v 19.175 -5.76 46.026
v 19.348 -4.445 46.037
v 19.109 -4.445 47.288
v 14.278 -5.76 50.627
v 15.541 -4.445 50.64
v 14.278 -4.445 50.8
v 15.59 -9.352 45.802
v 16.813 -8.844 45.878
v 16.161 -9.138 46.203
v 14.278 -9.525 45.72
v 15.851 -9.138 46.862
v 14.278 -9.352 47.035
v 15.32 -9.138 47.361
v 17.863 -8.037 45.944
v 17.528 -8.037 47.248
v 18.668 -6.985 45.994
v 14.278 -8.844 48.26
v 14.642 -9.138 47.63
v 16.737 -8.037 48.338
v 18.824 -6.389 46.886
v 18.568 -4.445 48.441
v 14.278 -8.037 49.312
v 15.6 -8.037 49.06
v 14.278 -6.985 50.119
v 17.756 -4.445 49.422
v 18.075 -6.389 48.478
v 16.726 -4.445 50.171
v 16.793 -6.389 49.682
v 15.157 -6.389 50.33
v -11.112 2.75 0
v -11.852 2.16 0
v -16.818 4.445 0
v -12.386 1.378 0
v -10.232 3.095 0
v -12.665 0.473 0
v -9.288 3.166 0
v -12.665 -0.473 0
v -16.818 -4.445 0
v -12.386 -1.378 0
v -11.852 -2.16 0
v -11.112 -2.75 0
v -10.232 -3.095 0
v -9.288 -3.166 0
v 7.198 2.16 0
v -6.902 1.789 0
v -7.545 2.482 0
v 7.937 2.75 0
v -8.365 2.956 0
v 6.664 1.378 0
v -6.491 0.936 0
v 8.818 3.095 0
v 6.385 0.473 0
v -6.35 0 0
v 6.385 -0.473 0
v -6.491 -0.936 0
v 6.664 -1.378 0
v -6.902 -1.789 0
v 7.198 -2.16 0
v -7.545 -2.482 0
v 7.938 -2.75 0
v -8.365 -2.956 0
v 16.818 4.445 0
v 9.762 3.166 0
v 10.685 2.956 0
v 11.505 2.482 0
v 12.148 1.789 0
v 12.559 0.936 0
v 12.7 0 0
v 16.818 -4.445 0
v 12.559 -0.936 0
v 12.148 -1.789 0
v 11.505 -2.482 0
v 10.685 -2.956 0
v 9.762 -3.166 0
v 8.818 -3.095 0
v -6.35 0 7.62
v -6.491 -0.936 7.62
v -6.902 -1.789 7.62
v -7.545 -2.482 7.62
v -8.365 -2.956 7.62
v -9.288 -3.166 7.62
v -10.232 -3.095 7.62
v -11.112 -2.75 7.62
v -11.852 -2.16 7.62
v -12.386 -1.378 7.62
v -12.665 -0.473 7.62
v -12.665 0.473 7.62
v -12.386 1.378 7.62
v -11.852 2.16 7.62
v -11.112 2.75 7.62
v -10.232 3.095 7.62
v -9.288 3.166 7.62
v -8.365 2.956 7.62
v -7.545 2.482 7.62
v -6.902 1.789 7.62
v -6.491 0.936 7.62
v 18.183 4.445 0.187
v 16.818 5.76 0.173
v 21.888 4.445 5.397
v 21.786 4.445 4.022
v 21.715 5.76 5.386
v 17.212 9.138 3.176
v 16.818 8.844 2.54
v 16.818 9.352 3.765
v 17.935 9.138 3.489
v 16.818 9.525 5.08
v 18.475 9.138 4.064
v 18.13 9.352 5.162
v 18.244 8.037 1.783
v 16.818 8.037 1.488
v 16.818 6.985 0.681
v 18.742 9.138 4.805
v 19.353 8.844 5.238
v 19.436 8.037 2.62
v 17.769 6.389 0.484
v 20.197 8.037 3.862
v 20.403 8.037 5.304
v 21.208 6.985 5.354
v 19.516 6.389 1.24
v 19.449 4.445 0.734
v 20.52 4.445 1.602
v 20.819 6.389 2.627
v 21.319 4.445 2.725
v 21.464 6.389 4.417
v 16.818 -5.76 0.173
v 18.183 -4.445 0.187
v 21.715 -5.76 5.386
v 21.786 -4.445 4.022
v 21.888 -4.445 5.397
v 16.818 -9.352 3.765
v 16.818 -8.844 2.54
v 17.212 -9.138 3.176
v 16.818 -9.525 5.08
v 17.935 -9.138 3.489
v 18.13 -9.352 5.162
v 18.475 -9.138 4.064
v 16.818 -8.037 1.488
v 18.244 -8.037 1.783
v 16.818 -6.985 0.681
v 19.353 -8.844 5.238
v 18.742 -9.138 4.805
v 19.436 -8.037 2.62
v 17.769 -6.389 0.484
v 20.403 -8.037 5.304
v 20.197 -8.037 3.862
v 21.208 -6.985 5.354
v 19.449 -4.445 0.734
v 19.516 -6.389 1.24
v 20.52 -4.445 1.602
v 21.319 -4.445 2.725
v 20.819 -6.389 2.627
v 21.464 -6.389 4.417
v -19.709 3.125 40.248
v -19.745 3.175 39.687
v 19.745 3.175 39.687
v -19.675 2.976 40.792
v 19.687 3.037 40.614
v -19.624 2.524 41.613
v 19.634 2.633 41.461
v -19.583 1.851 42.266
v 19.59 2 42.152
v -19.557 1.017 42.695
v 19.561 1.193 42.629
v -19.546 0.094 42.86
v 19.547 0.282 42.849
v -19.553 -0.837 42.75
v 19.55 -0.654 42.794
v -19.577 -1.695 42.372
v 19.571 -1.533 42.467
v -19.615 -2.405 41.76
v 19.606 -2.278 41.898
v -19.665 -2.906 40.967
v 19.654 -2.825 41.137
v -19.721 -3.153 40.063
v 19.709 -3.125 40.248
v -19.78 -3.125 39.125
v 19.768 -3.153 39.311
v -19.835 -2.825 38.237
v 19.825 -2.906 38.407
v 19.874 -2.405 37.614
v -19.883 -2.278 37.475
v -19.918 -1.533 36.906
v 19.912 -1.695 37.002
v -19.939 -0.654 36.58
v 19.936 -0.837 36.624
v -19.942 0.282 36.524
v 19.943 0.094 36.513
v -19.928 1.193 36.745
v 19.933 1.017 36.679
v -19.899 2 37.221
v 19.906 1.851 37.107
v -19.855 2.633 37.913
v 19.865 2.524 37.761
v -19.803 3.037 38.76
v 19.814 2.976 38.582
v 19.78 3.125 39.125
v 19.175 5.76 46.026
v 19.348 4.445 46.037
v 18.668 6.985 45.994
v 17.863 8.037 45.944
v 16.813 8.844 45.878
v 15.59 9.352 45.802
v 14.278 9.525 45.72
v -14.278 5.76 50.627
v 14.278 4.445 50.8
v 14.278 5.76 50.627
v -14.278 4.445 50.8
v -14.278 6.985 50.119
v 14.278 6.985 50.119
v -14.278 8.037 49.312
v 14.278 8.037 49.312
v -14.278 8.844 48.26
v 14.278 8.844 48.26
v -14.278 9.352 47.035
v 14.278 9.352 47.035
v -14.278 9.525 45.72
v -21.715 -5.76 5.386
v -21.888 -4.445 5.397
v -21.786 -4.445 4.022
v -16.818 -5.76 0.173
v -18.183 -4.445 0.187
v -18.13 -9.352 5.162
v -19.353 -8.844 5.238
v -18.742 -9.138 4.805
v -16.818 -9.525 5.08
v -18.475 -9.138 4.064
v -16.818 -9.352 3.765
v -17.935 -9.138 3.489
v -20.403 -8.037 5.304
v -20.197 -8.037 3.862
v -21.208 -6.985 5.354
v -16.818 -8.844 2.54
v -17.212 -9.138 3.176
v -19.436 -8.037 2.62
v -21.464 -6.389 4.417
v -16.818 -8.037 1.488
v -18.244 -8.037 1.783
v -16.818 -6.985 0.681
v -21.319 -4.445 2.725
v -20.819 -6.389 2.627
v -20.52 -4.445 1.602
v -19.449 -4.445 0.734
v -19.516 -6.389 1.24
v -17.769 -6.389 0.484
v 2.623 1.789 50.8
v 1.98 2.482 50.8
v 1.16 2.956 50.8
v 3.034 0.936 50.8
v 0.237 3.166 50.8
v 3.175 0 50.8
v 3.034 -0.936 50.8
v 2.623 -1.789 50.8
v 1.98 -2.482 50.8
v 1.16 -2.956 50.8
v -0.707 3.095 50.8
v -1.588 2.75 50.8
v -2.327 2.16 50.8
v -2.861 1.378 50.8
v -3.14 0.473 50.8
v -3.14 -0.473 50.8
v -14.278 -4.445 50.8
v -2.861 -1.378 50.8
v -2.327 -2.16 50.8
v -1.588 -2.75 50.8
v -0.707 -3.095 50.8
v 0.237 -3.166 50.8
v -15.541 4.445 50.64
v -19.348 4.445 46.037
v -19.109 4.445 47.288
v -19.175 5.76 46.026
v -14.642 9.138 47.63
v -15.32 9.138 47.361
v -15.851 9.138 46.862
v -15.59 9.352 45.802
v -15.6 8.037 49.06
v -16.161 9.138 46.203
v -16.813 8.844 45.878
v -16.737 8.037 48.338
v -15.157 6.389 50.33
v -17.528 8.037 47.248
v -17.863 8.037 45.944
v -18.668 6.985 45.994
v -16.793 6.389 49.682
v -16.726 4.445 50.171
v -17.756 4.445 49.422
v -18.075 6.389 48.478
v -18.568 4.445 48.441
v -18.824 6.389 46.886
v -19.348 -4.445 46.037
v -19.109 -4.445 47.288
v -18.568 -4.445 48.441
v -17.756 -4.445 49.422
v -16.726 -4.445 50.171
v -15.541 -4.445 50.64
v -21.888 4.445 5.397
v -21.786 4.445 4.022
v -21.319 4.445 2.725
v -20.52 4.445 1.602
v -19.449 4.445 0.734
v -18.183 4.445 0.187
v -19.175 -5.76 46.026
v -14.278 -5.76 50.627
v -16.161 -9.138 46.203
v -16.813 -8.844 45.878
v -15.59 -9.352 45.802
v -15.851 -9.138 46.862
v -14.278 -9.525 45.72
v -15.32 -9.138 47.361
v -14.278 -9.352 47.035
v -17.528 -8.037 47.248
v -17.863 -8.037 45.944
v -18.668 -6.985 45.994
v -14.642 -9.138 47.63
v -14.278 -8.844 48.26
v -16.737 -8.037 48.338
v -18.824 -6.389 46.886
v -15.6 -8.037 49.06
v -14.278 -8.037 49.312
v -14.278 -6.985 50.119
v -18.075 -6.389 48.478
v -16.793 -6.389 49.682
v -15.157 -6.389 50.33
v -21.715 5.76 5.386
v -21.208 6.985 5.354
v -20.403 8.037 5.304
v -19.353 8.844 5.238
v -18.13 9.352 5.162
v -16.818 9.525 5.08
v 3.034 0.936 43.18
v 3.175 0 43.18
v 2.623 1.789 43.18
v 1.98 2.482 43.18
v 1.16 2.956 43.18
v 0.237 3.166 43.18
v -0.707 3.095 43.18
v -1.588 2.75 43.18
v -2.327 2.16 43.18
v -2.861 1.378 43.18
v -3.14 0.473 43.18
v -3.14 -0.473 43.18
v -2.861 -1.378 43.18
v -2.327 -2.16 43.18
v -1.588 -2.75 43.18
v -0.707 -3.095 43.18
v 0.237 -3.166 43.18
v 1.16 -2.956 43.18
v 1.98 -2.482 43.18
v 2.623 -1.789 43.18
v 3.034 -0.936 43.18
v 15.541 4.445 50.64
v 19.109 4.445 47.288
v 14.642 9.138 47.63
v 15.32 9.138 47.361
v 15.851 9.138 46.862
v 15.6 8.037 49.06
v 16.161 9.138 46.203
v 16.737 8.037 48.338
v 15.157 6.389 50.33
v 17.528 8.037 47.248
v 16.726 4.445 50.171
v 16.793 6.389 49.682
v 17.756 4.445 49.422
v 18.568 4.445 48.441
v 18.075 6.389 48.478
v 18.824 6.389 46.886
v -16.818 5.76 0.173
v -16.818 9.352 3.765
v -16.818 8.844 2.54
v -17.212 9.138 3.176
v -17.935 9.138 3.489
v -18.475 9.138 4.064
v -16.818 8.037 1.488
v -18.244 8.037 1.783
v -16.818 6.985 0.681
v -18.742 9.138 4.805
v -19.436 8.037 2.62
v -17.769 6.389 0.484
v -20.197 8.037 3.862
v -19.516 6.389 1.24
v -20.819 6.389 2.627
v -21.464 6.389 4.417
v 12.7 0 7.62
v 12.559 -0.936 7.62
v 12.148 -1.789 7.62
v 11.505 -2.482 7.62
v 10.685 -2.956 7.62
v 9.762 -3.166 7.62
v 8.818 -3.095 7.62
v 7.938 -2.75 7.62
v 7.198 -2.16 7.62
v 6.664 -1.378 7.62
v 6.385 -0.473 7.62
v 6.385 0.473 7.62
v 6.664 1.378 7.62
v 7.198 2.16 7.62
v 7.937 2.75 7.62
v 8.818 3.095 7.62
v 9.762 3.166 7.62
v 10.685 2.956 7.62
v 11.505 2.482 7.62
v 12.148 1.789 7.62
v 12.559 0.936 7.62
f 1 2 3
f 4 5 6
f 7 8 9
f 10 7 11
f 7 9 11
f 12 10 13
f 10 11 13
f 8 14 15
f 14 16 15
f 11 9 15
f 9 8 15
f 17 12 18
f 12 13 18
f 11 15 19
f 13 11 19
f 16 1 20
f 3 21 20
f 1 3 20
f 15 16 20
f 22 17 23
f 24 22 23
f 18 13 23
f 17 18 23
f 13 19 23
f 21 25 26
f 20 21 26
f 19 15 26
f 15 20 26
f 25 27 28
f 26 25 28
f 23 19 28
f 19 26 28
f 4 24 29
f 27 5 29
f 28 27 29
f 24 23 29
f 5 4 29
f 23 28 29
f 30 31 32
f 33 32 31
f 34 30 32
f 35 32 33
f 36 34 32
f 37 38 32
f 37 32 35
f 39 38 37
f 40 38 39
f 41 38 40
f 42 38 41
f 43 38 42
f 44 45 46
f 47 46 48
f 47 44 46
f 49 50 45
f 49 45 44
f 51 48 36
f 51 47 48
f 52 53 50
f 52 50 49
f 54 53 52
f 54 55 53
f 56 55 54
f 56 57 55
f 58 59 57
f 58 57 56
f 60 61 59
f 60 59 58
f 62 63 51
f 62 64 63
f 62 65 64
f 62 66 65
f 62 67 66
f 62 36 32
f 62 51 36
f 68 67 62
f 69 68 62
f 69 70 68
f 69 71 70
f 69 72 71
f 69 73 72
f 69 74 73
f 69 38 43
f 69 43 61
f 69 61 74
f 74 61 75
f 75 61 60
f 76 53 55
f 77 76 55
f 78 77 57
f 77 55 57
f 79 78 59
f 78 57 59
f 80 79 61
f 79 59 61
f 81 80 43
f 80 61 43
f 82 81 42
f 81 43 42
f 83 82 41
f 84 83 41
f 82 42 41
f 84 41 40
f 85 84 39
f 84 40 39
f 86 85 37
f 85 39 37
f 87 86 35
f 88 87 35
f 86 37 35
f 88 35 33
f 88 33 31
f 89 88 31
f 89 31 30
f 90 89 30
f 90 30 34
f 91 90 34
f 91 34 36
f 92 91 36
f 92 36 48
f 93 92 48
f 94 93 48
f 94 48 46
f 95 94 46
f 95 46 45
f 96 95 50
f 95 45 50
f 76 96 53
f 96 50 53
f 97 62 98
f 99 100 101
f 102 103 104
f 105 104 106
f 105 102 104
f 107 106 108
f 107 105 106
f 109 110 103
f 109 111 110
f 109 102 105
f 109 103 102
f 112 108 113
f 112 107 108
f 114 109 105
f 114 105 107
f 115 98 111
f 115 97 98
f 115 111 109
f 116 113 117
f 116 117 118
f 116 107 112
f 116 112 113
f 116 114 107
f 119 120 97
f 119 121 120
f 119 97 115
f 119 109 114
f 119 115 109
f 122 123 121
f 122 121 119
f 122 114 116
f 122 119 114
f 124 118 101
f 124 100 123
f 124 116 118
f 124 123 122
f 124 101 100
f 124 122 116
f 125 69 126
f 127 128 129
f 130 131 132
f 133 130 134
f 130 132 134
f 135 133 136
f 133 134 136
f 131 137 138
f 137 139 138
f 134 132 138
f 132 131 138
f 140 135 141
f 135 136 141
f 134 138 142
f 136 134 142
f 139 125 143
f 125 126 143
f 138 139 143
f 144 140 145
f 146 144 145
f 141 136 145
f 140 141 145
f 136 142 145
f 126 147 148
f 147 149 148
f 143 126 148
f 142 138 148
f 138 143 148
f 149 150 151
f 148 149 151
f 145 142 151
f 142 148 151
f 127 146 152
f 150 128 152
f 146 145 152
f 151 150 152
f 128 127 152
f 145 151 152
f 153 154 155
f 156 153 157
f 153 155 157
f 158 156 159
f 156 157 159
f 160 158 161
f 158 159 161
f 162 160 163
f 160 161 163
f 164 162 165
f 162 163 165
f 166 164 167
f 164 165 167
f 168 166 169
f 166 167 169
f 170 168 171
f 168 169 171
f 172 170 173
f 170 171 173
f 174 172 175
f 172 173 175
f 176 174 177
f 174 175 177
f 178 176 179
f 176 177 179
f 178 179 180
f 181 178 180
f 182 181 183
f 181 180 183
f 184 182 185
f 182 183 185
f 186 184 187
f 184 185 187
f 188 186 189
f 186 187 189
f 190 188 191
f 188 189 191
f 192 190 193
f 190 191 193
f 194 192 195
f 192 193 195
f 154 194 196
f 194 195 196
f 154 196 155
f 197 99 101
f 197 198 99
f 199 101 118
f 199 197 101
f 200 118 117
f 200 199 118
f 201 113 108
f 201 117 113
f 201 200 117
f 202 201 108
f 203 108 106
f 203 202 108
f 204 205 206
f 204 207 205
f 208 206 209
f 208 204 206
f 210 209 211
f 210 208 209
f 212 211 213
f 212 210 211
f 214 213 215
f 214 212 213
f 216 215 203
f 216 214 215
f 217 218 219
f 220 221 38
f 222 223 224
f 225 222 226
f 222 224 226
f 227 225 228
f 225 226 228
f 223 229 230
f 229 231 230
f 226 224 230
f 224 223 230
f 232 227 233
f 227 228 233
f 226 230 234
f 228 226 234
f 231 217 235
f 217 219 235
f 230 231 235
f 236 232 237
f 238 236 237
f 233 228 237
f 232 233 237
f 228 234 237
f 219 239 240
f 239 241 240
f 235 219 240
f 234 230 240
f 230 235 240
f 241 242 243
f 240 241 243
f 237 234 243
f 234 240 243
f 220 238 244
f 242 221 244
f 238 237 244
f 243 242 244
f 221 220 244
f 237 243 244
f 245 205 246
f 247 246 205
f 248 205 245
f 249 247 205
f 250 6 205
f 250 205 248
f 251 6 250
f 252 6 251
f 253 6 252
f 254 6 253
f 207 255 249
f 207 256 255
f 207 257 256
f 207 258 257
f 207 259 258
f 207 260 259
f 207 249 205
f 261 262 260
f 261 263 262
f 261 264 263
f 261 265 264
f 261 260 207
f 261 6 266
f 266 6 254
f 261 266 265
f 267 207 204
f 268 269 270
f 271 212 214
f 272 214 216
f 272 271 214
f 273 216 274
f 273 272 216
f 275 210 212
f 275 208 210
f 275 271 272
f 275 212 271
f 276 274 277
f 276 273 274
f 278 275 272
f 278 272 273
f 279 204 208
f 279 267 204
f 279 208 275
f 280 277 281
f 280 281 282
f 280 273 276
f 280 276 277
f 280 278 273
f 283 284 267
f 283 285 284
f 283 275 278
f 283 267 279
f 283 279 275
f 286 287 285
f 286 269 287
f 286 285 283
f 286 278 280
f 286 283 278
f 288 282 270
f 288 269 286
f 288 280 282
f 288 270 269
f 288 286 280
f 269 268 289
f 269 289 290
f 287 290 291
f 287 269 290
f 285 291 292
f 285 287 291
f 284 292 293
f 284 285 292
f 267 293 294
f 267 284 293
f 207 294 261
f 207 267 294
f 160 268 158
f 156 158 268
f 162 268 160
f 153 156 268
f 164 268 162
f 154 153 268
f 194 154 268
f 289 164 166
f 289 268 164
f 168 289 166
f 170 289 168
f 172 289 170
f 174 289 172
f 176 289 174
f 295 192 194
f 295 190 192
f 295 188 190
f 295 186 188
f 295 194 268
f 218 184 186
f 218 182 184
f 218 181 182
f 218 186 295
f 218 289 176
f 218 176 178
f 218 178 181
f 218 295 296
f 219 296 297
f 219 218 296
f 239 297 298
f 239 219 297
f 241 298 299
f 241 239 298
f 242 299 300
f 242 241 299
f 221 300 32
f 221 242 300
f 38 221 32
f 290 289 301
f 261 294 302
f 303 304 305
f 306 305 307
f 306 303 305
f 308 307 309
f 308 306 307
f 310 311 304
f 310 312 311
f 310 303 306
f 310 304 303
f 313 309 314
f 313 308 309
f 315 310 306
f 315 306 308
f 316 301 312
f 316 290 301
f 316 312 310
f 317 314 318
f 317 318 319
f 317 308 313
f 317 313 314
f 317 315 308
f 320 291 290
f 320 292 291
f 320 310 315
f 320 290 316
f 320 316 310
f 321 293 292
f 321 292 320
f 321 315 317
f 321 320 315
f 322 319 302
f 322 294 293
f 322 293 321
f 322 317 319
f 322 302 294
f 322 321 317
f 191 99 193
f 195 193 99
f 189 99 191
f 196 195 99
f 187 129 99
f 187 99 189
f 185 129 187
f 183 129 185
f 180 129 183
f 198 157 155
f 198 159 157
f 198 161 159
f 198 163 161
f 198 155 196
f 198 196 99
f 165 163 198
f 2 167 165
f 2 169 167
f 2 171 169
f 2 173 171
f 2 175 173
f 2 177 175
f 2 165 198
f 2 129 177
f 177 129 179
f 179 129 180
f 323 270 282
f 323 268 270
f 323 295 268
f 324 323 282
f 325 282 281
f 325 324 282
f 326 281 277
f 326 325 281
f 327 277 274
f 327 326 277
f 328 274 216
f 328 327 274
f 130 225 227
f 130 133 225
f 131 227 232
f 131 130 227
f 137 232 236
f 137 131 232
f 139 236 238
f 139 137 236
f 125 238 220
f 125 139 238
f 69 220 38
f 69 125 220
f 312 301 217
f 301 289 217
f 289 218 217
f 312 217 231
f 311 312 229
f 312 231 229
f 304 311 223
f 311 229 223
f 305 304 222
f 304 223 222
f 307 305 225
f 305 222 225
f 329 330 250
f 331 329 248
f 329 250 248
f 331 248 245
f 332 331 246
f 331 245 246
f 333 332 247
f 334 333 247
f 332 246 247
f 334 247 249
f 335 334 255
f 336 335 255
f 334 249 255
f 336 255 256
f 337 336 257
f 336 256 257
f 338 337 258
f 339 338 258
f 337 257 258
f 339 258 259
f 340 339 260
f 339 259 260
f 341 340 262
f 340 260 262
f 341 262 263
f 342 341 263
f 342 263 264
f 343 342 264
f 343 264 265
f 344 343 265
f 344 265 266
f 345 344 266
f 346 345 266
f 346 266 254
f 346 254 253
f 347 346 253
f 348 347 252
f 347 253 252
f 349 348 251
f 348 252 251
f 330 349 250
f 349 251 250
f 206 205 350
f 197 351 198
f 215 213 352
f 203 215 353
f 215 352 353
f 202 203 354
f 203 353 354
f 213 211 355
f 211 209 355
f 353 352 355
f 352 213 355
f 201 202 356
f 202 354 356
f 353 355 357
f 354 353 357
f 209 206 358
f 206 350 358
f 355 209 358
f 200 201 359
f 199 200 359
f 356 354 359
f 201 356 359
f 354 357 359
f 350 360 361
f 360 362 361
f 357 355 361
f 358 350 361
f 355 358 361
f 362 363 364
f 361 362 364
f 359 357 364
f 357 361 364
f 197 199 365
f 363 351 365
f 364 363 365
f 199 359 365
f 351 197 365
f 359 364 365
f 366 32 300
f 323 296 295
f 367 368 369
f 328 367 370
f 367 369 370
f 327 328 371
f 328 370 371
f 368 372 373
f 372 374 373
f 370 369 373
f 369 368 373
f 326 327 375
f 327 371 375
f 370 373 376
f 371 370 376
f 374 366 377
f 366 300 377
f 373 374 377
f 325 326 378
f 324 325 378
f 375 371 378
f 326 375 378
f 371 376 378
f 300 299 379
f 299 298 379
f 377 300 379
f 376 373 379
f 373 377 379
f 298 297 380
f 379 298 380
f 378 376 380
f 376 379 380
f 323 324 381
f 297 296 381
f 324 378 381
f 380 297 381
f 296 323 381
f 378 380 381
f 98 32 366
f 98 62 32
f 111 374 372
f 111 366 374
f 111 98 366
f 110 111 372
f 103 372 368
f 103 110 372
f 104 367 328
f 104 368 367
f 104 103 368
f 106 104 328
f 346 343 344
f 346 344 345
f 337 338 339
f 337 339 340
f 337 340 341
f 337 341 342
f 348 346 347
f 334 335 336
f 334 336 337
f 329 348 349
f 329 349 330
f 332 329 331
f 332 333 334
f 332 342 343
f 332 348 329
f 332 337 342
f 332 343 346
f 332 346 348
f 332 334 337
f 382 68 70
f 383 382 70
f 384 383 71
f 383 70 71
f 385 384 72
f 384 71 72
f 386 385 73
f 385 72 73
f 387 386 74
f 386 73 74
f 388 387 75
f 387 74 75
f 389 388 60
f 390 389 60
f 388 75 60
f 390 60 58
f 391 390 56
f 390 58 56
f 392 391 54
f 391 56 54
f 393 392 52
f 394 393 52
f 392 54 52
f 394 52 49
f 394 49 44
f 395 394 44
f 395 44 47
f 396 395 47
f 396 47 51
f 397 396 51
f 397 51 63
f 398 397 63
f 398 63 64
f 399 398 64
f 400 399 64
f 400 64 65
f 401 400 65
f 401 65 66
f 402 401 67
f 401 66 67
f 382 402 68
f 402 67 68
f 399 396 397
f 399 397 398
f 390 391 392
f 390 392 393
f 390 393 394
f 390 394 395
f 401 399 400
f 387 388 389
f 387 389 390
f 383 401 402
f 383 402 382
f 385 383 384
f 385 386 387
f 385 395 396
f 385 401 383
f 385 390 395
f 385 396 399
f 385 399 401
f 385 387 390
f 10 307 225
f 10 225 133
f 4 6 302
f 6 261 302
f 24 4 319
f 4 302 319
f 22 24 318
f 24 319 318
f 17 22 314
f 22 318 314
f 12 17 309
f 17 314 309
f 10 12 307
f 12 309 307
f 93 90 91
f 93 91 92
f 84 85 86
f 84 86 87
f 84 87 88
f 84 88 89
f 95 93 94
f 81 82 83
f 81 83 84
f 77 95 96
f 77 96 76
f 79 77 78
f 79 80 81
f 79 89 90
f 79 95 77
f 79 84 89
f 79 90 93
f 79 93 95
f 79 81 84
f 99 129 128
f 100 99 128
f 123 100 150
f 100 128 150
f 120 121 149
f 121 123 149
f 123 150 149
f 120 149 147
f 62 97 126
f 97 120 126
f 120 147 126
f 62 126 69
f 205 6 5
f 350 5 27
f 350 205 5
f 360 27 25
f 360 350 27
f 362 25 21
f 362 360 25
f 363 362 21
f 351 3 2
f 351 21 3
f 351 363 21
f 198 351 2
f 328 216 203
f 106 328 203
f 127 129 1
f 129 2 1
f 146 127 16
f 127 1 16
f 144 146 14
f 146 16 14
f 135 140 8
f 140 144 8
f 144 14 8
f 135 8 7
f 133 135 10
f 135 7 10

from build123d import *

# Parameters (mm, degrees)
F1_DEPTH = 9.525
F2_R     = 5.08
F3_R     = 3.175
F4_DEPTH = 25.4
F5_R     = 3.175
F6_DEPTH = 7.62
F7_R     = 3.175
F8_DEPTH = 7.62


with BuildPart() as f1:
    # F0 (on Front) → F1 (new body, symmetric)
    with BuildSketch(Plane.XZ):
        Polygon((-19.05, 50.8), (-22.225, 0), (22.225, 0), (19.05, 50.8), align=None)
    extrude(amount=F1_DEPTH, both=True)

    # F2
    f2_edges = [f1.edges().sort_by_distance(p)[0] for p in [
        (0, -9.525, 50.8),
        (19.05, 0, 50.8),
        (-19.05, 0, 50.8),
        (0, 9.525, 50.8),
        (22.225, 0, 0),
        (0, -9.525, 0),
        (-22.225, 0, 0),
        (0, 9.525, 0),
        (20.6375, -9.525, 25.4),
        (20.6375, 9.525, 25.4),
        (-20.6375, 9.525, 25.4),
        (-20.6375, -9.525, 25.4),
    ]]
    fillet(f2_edges, radius=F2_R)

    # F3 (on Right) → F4 (cut, symmetric)
    with BuildSketch(Plane.YZ):
        with Locations((0, 39.686882)):
            Circle(F3_R)
    extrude(amount=F4_DEPTH, both=True, mode=Mode.SUBTRACT)

    # F5 (on face) → F6 (cut)
    with BuildSketch(Plane.XY.offset(50.8)):
        Circle(F5_R)
    extrude(amount=-F6_DEPTH, mode=Mode.SUBTRACT)

    # F7 (on face) → F8 (cut)
    with BuildSketch(Plane(origin=(0, 0, 0), x_dir=(1, 0, 0), z_dir=(0, 0, -1))):
        with Locations((-9.525, 0)):
            Circle(F7_R)
        with Locations((9.525, 0)):
            Circle(F7_R)
    extrude(amount=-F8_DEPTH, mode=Mode.SUBTRACT)


solid = f1.part
